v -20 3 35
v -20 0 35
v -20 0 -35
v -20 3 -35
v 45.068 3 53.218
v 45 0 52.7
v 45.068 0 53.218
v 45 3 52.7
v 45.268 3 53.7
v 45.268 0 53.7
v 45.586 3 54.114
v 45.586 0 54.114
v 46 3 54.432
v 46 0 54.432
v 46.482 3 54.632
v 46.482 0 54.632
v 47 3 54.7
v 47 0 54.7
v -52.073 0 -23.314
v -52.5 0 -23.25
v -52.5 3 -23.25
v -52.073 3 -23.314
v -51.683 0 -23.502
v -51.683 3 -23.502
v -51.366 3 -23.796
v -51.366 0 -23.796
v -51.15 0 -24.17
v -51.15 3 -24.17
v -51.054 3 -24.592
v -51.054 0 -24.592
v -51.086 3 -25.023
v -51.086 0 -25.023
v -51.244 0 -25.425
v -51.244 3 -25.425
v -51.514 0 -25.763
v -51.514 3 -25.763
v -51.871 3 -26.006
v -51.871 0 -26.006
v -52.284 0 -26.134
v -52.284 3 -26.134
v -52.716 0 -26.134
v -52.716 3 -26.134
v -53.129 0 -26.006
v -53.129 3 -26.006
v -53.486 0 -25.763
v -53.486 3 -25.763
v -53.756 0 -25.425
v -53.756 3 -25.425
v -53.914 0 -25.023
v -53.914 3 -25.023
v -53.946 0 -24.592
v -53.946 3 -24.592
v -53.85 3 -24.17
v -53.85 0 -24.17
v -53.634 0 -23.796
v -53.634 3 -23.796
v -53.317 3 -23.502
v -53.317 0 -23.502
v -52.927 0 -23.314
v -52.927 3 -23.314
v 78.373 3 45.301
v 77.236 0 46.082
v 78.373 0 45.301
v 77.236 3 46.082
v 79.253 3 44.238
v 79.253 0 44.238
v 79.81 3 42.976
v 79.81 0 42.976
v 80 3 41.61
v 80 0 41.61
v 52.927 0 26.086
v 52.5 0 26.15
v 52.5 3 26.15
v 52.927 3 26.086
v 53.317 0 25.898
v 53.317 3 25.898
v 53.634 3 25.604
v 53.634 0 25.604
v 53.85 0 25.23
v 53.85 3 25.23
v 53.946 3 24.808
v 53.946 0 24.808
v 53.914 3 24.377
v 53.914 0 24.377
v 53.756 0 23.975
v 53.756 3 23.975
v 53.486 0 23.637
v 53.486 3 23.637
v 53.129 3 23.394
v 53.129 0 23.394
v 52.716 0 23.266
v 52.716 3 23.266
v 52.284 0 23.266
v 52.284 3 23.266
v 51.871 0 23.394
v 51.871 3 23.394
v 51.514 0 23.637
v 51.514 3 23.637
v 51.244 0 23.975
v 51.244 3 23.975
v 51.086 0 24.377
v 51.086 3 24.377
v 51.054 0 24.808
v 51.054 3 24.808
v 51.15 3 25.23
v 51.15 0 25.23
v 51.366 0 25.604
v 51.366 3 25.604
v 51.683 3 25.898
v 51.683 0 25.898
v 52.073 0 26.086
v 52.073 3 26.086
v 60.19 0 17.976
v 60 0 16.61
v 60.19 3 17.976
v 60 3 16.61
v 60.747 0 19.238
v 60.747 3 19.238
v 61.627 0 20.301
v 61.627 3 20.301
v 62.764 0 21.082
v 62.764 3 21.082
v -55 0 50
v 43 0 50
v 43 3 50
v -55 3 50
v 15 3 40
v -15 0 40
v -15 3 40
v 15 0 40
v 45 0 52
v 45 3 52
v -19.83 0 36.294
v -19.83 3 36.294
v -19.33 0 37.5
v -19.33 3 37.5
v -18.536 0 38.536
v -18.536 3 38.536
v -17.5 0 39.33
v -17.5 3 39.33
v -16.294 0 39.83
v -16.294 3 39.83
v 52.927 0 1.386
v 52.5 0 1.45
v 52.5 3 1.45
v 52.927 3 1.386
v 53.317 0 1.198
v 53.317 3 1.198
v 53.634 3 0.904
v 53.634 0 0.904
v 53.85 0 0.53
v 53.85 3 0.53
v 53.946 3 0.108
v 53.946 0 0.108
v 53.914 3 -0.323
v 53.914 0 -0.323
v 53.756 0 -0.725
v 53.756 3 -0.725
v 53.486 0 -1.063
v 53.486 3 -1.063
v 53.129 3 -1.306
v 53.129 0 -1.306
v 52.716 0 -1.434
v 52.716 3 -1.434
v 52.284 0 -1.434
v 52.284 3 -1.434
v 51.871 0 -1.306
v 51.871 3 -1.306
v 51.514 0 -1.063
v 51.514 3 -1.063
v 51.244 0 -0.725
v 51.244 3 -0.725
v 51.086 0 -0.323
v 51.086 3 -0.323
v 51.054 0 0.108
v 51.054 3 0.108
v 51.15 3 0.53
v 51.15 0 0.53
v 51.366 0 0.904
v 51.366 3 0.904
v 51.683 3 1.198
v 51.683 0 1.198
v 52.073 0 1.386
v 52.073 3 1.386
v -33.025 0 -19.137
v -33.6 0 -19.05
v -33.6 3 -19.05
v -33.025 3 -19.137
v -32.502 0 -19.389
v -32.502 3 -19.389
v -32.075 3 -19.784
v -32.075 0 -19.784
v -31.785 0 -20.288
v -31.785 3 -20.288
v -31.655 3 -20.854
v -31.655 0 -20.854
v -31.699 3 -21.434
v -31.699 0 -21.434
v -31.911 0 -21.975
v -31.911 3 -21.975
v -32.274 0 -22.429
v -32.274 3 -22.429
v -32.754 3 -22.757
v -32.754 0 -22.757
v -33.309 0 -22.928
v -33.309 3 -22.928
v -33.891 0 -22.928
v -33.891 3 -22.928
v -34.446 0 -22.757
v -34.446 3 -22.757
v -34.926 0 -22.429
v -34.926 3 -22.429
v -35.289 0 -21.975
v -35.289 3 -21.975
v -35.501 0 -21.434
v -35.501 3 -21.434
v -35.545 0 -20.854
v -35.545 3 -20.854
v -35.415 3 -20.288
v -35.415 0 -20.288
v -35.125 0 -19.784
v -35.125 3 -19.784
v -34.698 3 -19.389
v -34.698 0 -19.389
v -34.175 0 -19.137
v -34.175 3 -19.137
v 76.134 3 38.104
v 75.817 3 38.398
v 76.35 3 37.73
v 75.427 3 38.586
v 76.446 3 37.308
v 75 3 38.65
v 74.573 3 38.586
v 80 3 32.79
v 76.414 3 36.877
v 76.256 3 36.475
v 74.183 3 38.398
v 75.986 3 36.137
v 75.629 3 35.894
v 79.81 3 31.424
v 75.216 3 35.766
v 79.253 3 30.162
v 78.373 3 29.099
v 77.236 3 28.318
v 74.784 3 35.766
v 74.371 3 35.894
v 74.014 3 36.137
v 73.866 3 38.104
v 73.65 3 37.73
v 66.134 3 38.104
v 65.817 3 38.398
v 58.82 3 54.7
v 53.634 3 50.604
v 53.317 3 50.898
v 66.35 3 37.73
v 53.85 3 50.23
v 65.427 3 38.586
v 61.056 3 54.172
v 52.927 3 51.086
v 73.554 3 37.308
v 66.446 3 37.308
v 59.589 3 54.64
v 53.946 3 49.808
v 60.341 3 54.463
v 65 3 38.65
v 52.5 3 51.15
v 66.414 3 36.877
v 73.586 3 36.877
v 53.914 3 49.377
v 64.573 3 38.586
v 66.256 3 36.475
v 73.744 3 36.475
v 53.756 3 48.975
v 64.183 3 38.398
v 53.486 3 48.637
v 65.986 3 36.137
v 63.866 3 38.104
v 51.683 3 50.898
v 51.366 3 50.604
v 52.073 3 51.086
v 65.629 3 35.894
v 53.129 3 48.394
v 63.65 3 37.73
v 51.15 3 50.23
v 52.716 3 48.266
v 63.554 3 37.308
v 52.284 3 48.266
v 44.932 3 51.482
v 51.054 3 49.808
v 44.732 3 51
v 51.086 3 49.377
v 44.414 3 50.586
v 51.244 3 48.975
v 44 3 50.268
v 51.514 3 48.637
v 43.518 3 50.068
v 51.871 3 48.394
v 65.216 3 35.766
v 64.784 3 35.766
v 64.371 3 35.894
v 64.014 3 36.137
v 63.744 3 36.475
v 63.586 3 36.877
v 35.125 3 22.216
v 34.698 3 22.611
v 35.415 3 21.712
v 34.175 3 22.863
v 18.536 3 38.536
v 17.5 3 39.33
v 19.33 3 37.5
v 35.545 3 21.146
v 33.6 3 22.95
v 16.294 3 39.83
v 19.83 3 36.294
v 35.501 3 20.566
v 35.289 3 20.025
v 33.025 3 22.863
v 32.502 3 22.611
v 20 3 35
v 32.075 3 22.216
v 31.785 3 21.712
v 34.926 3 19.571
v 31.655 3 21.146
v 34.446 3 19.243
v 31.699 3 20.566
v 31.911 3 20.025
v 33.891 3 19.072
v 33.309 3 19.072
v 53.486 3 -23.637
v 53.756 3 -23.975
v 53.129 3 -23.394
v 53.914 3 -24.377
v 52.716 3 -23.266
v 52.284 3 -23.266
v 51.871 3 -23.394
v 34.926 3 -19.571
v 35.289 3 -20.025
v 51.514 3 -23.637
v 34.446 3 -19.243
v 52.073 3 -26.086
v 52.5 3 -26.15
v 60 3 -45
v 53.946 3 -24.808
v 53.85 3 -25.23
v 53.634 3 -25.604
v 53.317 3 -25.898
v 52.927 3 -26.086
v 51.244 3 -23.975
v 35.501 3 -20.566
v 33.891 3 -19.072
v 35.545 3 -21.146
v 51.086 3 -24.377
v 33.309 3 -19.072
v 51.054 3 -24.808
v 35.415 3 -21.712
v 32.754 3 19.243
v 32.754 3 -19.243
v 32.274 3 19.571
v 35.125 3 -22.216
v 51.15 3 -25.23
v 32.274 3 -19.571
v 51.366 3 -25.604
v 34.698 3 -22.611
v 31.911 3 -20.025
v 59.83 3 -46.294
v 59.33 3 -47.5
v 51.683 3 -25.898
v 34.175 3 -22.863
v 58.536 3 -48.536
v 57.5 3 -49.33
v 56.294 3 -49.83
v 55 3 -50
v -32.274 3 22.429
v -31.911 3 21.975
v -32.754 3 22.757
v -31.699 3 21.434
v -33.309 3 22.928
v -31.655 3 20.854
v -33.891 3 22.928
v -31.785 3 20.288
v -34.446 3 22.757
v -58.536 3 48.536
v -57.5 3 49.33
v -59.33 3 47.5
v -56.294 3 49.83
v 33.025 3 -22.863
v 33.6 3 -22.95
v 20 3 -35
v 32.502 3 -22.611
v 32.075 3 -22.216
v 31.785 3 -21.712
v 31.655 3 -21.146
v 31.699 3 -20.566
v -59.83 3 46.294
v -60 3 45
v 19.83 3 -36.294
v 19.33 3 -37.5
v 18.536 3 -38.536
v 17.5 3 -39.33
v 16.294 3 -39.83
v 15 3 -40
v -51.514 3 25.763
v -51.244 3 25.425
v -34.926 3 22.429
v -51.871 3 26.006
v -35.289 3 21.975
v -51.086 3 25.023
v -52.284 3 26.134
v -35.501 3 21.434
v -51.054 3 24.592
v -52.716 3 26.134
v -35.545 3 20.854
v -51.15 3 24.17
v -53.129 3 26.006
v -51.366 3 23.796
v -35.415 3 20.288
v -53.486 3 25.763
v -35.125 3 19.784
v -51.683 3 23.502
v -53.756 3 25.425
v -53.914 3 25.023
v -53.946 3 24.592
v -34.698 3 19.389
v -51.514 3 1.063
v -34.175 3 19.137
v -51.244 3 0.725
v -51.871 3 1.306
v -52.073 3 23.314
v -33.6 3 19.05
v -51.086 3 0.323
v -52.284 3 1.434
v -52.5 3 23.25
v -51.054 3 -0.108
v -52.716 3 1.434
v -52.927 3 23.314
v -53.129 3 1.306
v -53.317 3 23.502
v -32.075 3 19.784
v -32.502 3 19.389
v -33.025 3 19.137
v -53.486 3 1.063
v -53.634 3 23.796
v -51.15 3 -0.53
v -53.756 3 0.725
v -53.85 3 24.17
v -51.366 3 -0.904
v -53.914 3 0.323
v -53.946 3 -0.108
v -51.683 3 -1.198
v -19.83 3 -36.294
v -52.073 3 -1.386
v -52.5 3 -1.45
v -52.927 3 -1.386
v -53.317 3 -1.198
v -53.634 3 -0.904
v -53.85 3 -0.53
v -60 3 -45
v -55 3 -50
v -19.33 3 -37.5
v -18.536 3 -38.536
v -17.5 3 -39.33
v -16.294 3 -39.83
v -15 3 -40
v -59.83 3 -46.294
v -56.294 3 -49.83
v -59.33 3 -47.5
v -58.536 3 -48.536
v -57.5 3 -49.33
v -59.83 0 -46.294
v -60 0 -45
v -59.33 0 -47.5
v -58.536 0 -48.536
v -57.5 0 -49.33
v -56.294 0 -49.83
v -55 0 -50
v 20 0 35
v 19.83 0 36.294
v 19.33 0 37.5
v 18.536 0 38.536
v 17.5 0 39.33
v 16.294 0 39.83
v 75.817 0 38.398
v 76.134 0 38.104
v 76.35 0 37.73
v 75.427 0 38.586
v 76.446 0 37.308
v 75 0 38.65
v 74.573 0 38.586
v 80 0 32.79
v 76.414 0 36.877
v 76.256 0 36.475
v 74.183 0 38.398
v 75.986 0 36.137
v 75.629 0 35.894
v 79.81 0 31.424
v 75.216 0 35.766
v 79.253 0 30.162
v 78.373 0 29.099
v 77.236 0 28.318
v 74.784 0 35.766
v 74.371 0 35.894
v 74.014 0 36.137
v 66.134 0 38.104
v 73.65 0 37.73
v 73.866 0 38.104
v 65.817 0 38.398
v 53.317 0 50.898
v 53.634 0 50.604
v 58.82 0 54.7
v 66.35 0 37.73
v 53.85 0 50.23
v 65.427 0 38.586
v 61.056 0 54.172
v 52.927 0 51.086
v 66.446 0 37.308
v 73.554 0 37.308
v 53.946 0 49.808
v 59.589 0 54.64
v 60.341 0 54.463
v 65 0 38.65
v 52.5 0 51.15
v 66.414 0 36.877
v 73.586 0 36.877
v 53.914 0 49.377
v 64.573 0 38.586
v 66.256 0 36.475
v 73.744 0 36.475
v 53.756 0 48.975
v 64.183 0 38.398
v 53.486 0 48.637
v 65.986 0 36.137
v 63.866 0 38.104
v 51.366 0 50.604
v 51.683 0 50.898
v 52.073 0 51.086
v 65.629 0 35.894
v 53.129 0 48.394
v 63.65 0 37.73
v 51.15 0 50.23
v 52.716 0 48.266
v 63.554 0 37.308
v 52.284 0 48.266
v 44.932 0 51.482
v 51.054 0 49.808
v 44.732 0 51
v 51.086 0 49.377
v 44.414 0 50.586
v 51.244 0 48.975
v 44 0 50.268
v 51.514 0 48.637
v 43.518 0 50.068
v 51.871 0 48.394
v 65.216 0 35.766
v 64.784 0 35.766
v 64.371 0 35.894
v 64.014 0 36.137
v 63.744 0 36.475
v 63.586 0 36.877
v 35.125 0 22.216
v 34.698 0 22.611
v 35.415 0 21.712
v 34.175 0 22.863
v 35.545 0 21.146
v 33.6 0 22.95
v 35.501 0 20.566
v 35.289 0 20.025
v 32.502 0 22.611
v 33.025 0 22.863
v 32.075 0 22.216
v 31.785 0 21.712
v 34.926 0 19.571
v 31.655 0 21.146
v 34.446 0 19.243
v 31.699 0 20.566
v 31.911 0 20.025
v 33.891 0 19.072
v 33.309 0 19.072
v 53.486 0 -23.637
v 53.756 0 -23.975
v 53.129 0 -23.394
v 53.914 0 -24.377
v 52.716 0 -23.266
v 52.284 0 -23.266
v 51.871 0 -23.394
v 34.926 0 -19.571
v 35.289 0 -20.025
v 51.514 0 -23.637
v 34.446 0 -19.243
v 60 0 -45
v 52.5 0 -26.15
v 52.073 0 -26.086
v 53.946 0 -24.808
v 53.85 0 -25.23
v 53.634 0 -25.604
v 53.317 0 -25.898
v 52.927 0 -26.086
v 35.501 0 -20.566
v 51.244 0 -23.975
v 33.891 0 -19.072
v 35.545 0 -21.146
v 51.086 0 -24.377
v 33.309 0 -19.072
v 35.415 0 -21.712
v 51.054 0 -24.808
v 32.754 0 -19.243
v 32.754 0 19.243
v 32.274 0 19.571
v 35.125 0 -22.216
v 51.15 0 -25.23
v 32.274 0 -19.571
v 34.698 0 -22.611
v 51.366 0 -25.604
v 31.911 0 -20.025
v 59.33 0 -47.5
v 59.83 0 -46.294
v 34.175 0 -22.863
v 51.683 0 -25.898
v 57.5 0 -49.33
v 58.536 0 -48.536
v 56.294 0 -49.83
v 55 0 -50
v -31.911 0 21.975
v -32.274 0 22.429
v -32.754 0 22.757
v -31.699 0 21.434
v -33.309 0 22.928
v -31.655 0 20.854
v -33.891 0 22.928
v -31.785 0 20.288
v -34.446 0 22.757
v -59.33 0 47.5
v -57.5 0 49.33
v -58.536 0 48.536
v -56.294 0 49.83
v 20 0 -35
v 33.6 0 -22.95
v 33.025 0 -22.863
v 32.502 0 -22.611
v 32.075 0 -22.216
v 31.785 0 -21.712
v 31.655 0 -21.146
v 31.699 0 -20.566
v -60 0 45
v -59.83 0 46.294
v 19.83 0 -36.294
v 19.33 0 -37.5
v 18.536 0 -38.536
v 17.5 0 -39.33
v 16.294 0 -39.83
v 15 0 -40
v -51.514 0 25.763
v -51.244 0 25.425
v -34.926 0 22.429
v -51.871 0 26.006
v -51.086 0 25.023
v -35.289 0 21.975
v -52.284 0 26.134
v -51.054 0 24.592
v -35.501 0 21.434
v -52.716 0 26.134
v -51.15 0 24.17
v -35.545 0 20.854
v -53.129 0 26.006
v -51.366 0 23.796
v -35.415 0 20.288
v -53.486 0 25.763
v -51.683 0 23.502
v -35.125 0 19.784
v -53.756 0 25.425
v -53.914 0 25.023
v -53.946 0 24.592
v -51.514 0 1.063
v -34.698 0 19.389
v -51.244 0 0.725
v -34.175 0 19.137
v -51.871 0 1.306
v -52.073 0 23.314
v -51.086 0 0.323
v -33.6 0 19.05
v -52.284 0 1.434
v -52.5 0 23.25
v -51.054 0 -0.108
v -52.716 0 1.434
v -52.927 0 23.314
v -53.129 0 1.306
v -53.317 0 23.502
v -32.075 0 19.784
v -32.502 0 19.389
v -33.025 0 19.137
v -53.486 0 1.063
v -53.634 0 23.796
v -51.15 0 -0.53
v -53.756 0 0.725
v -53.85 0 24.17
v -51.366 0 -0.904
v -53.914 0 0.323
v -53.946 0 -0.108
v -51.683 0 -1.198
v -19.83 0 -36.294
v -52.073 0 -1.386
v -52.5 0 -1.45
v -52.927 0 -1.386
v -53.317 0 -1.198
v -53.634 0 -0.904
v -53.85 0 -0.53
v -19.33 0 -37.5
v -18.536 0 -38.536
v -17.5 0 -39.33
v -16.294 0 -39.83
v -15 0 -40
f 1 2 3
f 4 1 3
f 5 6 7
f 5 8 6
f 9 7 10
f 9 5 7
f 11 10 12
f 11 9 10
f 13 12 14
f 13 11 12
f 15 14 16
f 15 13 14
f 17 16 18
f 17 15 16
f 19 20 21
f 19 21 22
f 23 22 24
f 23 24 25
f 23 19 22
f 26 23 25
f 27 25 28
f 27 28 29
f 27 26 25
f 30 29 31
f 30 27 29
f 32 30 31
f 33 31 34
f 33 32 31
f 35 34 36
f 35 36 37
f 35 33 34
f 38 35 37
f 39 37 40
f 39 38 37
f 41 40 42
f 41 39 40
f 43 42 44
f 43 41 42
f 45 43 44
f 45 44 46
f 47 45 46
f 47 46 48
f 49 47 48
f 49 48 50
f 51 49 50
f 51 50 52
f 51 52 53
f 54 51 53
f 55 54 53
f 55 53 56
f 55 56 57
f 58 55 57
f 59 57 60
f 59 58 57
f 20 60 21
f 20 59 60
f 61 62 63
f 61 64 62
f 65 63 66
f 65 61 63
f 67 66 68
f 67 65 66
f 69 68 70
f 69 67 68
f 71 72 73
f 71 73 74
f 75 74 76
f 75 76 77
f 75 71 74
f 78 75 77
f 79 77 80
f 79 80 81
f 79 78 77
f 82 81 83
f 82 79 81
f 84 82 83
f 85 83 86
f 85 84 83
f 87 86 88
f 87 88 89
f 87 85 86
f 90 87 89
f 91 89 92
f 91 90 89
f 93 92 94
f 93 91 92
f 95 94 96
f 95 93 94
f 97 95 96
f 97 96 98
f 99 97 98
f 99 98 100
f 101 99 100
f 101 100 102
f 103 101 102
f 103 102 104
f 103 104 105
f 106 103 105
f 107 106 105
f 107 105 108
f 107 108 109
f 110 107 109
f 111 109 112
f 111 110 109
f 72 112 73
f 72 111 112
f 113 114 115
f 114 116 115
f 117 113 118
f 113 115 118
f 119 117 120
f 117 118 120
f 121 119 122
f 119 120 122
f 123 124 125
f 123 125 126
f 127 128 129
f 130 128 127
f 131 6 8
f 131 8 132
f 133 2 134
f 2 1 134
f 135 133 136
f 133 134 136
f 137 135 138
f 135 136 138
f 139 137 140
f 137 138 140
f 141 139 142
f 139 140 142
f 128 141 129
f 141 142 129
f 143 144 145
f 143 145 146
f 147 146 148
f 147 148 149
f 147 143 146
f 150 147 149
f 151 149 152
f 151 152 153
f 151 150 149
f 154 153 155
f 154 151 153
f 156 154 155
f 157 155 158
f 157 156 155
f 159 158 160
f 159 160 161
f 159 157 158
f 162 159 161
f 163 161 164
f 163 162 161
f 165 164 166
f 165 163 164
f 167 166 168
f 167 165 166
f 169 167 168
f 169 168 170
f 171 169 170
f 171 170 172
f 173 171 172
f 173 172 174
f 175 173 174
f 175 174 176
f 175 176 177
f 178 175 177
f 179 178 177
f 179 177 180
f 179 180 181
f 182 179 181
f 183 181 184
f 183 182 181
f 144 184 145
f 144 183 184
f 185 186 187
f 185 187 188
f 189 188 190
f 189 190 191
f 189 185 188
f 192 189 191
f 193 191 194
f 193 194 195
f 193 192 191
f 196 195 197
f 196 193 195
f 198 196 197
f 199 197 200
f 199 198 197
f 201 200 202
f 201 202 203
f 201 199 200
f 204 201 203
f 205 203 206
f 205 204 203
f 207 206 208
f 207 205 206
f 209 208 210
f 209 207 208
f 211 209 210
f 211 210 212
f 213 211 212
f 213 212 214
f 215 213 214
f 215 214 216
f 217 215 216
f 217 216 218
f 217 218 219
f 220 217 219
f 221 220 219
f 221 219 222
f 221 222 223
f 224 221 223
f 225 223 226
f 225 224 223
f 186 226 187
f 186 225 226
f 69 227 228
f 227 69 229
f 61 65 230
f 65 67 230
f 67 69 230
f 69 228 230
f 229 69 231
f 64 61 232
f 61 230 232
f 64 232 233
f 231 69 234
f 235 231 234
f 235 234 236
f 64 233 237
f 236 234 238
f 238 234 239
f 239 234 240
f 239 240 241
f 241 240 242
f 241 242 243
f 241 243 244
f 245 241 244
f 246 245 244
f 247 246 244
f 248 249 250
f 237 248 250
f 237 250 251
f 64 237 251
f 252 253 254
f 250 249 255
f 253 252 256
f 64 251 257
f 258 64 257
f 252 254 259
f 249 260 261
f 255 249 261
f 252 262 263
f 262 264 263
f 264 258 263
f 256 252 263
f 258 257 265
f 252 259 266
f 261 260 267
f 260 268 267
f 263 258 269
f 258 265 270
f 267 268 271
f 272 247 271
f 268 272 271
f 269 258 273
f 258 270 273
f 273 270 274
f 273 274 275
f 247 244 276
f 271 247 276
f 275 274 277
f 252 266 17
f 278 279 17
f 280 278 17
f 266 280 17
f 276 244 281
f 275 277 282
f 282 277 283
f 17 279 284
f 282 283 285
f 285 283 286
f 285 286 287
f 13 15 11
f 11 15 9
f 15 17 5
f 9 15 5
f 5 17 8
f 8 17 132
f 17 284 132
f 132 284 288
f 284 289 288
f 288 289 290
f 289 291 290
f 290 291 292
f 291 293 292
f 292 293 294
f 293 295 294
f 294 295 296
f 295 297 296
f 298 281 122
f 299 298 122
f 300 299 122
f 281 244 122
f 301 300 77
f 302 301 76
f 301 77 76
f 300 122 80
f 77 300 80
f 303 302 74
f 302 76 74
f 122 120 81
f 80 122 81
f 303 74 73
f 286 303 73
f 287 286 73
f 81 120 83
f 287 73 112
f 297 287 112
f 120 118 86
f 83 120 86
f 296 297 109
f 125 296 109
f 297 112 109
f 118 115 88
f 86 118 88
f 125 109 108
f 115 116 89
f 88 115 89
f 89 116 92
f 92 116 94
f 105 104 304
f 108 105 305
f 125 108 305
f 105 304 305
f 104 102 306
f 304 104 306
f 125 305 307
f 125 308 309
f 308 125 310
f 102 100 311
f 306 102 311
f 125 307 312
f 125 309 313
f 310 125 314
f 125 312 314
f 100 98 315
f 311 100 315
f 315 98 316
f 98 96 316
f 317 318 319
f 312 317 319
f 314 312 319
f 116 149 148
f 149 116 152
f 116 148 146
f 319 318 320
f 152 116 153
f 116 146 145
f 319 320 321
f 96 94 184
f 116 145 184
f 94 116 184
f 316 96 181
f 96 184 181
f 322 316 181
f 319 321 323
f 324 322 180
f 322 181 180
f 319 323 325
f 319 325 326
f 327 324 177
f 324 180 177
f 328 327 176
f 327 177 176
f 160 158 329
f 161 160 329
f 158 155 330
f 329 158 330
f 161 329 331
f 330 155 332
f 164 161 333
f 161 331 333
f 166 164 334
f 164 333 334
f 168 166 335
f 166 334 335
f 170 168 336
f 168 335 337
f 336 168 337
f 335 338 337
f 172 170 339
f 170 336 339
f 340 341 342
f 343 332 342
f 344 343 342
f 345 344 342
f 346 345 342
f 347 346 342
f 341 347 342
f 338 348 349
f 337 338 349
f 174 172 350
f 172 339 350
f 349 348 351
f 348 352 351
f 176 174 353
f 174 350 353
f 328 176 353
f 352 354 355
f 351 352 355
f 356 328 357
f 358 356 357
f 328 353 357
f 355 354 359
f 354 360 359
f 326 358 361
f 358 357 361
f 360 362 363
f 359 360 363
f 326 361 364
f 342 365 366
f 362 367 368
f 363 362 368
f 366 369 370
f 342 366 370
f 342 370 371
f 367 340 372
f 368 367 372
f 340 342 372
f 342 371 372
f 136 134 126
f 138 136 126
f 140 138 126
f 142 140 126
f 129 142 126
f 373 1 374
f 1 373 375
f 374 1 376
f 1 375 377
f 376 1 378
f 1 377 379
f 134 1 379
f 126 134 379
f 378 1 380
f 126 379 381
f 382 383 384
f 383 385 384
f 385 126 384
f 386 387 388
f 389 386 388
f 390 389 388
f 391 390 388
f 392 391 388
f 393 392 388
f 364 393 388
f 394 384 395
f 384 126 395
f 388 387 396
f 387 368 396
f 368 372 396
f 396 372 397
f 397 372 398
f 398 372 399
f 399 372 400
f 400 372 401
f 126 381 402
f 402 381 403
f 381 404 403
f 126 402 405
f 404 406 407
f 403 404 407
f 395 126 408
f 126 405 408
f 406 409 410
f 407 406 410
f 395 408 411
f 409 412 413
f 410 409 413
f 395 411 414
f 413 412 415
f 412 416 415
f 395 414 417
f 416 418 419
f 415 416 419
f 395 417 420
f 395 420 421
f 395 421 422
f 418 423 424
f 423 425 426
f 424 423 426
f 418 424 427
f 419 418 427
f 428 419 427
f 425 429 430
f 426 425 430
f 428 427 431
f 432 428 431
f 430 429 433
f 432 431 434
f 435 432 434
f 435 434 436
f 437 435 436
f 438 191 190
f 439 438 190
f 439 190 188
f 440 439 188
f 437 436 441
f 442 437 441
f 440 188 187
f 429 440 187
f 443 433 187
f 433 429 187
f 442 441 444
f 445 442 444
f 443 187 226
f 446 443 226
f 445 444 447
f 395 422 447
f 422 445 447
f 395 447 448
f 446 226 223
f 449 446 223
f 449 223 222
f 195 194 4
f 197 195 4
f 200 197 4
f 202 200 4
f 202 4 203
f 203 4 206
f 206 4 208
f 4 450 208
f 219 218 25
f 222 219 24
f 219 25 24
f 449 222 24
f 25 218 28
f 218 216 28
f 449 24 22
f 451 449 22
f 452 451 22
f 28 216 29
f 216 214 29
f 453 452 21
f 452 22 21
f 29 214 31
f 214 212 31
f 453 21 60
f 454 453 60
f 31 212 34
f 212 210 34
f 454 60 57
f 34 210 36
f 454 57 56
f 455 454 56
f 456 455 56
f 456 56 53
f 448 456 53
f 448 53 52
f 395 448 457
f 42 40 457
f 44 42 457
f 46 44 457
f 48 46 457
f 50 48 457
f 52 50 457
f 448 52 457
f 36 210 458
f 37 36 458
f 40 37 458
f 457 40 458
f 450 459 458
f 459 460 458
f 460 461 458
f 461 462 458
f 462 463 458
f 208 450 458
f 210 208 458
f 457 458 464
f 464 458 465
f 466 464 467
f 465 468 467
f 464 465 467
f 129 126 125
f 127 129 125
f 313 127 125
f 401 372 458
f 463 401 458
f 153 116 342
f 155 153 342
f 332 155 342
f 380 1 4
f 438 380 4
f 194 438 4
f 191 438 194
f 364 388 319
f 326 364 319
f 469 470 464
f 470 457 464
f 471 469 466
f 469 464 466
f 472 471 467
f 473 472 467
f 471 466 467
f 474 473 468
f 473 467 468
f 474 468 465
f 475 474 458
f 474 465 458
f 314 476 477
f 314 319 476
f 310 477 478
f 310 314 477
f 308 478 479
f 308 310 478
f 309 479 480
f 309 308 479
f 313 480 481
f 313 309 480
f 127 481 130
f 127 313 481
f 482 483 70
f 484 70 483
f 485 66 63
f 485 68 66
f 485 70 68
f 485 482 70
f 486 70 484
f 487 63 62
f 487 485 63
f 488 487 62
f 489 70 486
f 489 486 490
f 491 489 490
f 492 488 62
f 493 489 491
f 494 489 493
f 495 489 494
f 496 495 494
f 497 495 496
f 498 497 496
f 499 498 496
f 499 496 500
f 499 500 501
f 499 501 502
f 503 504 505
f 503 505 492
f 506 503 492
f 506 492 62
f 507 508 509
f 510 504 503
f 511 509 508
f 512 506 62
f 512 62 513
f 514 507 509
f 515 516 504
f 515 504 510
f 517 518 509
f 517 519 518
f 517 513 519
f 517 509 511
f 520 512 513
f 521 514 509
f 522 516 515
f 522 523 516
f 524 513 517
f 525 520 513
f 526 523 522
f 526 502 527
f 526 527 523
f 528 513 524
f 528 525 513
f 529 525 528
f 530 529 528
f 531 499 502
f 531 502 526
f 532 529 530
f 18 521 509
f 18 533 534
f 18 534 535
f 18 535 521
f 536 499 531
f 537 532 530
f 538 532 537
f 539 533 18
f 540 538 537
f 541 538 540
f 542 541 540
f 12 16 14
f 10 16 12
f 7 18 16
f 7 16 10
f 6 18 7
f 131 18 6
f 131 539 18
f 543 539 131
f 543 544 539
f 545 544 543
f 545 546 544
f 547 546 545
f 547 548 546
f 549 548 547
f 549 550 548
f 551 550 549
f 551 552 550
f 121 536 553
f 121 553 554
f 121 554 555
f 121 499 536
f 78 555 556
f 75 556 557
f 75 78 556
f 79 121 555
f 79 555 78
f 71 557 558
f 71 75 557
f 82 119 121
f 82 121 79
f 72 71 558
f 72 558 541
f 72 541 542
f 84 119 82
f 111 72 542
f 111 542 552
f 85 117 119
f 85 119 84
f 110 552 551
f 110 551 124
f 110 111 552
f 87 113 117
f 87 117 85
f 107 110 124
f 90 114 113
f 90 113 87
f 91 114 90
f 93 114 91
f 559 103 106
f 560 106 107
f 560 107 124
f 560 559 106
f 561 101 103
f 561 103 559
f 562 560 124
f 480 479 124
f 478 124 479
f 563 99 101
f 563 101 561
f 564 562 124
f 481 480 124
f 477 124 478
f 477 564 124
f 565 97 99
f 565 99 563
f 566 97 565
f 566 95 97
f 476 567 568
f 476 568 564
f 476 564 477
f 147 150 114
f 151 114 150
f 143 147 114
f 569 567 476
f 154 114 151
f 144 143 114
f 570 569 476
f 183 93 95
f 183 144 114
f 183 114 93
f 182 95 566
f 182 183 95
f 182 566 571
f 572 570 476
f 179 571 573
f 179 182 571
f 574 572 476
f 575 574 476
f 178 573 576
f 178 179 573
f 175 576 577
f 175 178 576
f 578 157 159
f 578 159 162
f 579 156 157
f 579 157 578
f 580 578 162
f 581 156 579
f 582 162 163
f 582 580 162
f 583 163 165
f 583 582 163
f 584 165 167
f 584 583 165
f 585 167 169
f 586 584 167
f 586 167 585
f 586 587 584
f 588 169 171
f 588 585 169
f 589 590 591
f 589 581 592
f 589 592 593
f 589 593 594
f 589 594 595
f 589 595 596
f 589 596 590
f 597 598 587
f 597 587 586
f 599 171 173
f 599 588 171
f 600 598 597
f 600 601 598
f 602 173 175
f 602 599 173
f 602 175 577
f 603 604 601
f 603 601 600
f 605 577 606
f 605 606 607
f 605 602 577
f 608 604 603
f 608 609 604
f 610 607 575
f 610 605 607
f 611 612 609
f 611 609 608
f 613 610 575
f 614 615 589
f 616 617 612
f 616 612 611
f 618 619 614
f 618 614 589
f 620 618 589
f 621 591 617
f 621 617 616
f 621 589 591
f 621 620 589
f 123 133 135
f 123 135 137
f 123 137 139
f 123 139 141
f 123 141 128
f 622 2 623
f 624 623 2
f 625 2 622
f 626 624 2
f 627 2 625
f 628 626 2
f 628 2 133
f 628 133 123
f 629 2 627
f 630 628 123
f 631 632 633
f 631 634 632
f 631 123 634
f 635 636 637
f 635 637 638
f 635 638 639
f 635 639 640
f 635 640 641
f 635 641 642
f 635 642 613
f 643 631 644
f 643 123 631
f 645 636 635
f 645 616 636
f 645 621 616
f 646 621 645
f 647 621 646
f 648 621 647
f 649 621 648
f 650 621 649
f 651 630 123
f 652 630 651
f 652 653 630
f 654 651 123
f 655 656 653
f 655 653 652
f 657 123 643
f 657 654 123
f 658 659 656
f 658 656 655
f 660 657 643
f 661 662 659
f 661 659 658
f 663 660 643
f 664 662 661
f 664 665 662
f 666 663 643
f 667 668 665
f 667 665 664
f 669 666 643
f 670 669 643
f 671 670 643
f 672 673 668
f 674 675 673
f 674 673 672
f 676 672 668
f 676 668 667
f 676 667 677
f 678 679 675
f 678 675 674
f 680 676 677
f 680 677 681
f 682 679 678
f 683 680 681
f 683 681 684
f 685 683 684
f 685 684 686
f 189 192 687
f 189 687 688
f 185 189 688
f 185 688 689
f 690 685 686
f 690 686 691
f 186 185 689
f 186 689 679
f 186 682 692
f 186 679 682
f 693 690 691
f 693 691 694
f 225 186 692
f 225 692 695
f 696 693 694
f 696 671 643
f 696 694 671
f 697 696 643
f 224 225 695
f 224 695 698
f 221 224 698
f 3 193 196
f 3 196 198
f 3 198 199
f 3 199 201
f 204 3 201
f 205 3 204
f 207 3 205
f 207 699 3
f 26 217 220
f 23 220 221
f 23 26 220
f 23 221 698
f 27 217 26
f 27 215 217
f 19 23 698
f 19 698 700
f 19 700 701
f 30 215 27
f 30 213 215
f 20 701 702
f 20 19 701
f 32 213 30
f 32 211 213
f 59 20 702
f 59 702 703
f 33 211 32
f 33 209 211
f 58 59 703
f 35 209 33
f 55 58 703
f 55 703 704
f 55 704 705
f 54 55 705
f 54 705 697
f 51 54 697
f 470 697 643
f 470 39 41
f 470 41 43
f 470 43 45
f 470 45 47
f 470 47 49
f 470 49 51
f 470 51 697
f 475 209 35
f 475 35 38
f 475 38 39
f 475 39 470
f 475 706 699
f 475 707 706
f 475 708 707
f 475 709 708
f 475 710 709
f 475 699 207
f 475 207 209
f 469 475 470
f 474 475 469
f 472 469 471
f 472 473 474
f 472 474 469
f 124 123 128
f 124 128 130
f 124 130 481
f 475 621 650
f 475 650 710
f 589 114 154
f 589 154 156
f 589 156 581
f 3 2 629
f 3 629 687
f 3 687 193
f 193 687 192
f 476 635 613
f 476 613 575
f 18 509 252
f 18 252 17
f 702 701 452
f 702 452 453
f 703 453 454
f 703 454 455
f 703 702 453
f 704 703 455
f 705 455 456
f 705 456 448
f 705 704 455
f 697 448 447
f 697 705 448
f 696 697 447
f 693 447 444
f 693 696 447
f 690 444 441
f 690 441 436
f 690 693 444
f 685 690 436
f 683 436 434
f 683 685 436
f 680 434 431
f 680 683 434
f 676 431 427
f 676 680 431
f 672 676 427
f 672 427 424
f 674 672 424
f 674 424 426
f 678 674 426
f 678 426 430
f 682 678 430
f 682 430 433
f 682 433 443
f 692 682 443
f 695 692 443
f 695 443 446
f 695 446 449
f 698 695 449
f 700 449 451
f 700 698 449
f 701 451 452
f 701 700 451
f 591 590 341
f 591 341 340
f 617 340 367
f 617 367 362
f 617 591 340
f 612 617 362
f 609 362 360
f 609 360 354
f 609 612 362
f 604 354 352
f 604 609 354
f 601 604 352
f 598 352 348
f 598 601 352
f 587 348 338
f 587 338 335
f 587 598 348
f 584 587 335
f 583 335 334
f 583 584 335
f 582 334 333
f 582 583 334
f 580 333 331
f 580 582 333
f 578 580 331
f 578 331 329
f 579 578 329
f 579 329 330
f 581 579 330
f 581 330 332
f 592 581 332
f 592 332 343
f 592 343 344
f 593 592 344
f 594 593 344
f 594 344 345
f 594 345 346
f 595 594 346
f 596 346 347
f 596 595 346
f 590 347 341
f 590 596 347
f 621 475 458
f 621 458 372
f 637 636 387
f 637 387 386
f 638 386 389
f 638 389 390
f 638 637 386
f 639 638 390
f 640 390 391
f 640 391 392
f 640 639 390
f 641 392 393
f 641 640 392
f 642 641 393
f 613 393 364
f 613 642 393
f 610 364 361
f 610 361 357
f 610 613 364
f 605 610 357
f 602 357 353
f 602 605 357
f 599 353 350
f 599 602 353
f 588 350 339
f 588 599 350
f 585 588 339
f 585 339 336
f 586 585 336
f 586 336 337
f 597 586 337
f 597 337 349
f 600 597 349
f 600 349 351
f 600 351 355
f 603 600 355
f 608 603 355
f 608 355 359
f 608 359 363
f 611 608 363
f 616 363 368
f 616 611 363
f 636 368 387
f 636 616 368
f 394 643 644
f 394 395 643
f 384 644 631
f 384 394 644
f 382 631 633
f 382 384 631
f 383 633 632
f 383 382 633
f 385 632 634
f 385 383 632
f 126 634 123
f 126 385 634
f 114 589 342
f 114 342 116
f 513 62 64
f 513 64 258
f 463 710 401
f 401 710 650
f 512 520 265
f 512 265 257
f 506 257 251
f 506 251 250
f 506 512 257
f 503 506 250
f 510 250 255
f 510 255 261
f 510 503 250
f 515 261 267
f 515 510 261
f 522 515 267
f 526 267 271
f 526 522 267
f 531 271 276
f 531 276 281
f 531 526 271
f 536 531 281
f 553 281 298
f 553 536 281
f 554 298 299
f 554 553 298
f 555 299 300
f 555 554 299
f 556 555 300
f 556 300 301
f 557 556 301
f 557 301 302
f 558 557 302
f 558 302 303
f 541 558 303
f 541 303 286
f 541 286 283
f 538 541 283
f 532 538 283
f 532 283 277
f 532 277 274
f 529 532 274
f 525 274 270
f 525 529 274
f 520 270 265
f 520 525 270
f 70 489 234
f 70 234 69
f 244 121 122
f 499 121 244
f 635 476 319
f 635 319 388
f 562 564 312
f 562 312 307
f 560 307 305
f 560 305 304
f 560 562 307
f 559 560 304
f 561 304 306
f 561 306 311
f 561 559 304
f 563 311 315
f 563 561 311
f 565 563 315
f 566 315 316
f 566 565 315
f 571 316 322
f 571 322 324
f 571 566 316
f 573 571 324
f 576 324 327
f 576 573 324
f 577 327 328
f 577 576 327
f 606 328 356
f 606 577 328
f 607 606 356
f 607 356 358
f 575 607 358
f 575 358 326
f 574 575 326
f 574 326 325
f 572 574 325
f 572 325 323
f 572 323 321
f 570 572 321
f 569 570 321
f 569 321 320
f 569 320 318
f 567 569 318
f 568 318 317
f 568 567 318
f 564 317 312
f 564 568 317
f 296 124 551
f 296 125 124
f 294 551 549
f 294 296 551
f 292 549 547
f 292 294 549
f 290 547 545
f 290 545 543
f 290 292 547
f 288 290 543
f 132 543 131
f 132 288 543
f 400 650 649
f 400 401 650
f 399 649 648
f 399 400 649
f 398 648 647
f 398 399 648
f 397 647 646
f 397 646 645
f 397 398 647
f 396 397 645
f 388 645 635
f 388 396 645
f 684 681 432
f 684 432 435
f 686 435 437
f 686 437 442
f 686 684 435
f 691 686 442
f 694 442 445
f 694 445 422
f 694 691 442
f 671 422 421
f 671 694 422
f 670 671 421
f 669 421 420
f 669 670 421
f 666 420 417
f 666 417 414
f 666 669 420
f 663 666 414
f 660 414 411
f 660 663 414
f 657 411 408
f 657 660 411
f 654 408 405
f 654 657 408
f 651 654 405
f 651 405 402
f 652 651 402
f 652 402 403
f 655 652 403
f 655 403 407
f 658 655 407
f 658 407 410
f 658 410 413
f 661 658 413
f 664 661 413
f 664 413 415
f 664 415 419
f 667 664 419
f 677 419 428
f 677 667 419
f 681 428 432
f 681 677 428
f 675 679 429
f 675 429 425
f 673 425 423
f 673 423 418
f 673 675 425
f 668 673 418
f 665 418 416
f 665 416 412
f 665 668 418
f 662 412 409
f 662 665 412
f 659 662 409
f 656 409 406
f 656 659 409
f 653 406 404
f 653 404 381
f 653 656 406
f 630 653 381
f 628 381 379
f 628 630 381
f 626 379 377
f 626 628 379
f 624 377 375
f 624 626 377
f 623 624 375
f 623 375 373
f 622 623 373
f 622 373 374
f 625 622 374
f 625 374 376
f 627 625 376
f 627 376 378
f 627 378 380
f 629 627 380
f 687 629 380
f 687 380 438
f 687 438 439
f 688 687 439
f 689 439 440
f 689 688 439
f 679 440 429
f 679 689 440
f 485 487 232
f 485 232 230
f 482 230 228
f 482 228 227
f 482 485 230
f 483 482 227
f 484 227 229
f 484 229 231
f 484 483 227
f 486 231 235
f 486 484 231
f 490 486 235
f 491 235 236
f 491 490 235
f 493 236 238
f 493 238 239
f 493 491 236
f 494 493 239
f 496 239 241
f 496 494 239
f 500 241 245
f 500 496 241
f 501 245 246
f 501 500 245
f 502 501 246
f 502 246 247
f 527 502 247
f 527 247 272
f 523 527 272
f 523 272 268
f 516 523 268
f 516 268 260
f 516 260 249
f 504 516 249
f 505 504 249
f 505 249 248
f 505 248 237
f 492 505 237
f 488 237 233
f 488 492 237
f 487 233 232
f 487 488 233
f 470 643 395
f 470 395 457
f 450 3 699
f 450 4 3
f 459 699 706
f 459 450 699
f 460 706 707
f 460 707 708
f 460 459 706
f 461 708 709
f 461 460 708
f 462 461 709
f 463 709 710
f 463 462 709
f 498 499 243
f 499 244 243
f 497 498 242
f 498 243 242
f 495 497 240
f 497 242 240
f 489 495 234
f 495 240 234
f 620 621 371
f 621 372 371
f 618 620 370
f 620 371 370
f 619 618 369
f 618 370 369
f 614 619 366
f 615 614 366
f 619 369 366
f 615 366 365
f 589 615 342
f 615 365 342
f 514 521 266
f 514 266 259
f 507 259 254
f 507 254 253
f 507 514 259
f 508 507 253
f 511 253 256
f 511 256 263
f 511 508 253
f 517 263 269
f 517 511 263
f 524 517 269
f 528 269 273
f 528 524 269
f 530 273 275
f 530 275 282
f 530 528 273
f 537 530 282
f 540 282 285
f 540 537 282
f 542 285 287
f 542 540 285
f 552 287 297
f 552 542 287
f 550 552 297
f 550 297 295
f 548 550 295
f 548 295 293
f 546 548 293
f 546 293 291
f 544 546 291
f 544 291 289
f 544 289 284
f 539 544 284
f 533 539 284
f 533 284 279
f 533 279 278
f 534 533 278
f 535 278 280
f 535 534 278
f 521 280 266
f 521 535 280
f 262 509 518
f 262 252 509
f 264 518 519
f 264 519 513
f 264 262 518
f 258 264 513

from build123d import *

# Parameters (mm, degrees)
SKETCH_1_R      = 1.95
SKETCH_1_R_2    = 1.45
SKETCH_1_W      = 40
SKETCH_1_H      = 80
EXTRUDE_1_DEPTH = 3
FILLET_1_R      = 5
FILLET_3_R      = 2


with BuildPart() as part:
    # 草图1 → 凸台-拉伸1 (new body)
    with BuildSketch(Plane(origin=(0, 0, 0), x_dir=(1, 0, 0), z_dir=(0, 1, 0))):
        Polygon((-60, -50), (-60, 50), (60, 50), (60, -19.7), (80, -29.7), (80, -44.7), (60, -54.7), (45, -54.7), (45, -50), align=None)
        with Locations(Location((-33.6, 21, 0), (0, 0, 270))):
            Circle(SKETCH_1_R, mode=Mode.SUBTRACT)
        with Locations(Location((-33.6, -21, 0), (0, 0, 90))):
            Circle(SKETCH_1_R, mode=Mode.SUBTRACT)
        with Locations(Location((33.6, -21, 0), (0, 0, 270))):
            Circle(SKETCH_1_R, mode=Mode.SUBTRACT)
        with Locations(Location((33.6, 21, 0), (0, 0, 90))):
            Circle(SKETCH_1_R, mode=Mode.SUBTRACT)
        with Locations(Location((65, -37.2, 0), (0, 0, 270))):
            Circle(SKETCH_1_R_2, mode=Mode.SUBTRACT)
        with Locations(Location((75, -37.2, 0), (0, 0, 270))):
            Circle(SKETCH_1_R_2, mode=Mode.SUBTRACT)
        with Locations(Location((52.5, -24.7, 0), (0, 0, 270))):
            Circle(SKETCH_1_R_2, mode=Mode.SUBTRACT)
        with Locations(Location((52.5, -49.7, 0), (0, 0, 270))):
            Circle(SKETCH_1_R_2, mode=Mode.SUBTRACT)
        with Locations(Location((52.5, 0, 0), (0, 0, 270))):
            Circle(SKETCH_1_R_2, mode=Mode.SUBTRACT)
        with Locations(Location((-52.5, 0, 0), (0, 0, 90))):
            Circle(SKETCH_1_R_2, mode=Mode.SUBTRACT)
        with Locations(Location((-52.5, -24.7, 0), (0, 0, 90))):
            Circle(SKETCH_1_R_2, mode=Mode.SUBTRACT)
        with Locations(Location((-52.5, 24.7, 0), (0, 0, 270))):
            Circle(SKETCH_1_R_2, mode=Mode.SUBTRACT)
        with Locations(Location((52.5, 24.7, 0), (0, 0, 90))):
            Circle(SKETCH_1_R_2, mode=Mode.SUBTRACT)
        Rectangle(SKETCH_1_W, SKETCH_1_H, mode=Mode.SUBTRACT)
    extrude(amount=EXTRUDE_1_DEPTH)

    # 圆角1
    fillet_1_edges = [part.edges().sort_by_distance(p)[0] for p in [
        (60, 1.5, 19.7),
        (80, 1.5, 29.7),
        (80, 1.5, 44.7),
        (60, 1.5, 54.7),
        (-60, 1.5, 50),
        (-60, 1.5, -50),
        (60, 1.5, -50),
        (20, 1.5, 40),
        (20, 1.5, -40),
        (-20, 1.5, -40),
        (-20, 1.5, 40),
    ]]
    fillet(fillet_1_edges, radius=FILLET_1_R)

    # 圆角3
    fillet_3_edges = [part.edges().sort_by_distance(p)[0] for p in [
        (45, 1.5, 54.7),
        (45, 1.5, 50),
    ]]
    fillet(fillet_3_edges, radius=FILLET_3_R)


solid = part.part
